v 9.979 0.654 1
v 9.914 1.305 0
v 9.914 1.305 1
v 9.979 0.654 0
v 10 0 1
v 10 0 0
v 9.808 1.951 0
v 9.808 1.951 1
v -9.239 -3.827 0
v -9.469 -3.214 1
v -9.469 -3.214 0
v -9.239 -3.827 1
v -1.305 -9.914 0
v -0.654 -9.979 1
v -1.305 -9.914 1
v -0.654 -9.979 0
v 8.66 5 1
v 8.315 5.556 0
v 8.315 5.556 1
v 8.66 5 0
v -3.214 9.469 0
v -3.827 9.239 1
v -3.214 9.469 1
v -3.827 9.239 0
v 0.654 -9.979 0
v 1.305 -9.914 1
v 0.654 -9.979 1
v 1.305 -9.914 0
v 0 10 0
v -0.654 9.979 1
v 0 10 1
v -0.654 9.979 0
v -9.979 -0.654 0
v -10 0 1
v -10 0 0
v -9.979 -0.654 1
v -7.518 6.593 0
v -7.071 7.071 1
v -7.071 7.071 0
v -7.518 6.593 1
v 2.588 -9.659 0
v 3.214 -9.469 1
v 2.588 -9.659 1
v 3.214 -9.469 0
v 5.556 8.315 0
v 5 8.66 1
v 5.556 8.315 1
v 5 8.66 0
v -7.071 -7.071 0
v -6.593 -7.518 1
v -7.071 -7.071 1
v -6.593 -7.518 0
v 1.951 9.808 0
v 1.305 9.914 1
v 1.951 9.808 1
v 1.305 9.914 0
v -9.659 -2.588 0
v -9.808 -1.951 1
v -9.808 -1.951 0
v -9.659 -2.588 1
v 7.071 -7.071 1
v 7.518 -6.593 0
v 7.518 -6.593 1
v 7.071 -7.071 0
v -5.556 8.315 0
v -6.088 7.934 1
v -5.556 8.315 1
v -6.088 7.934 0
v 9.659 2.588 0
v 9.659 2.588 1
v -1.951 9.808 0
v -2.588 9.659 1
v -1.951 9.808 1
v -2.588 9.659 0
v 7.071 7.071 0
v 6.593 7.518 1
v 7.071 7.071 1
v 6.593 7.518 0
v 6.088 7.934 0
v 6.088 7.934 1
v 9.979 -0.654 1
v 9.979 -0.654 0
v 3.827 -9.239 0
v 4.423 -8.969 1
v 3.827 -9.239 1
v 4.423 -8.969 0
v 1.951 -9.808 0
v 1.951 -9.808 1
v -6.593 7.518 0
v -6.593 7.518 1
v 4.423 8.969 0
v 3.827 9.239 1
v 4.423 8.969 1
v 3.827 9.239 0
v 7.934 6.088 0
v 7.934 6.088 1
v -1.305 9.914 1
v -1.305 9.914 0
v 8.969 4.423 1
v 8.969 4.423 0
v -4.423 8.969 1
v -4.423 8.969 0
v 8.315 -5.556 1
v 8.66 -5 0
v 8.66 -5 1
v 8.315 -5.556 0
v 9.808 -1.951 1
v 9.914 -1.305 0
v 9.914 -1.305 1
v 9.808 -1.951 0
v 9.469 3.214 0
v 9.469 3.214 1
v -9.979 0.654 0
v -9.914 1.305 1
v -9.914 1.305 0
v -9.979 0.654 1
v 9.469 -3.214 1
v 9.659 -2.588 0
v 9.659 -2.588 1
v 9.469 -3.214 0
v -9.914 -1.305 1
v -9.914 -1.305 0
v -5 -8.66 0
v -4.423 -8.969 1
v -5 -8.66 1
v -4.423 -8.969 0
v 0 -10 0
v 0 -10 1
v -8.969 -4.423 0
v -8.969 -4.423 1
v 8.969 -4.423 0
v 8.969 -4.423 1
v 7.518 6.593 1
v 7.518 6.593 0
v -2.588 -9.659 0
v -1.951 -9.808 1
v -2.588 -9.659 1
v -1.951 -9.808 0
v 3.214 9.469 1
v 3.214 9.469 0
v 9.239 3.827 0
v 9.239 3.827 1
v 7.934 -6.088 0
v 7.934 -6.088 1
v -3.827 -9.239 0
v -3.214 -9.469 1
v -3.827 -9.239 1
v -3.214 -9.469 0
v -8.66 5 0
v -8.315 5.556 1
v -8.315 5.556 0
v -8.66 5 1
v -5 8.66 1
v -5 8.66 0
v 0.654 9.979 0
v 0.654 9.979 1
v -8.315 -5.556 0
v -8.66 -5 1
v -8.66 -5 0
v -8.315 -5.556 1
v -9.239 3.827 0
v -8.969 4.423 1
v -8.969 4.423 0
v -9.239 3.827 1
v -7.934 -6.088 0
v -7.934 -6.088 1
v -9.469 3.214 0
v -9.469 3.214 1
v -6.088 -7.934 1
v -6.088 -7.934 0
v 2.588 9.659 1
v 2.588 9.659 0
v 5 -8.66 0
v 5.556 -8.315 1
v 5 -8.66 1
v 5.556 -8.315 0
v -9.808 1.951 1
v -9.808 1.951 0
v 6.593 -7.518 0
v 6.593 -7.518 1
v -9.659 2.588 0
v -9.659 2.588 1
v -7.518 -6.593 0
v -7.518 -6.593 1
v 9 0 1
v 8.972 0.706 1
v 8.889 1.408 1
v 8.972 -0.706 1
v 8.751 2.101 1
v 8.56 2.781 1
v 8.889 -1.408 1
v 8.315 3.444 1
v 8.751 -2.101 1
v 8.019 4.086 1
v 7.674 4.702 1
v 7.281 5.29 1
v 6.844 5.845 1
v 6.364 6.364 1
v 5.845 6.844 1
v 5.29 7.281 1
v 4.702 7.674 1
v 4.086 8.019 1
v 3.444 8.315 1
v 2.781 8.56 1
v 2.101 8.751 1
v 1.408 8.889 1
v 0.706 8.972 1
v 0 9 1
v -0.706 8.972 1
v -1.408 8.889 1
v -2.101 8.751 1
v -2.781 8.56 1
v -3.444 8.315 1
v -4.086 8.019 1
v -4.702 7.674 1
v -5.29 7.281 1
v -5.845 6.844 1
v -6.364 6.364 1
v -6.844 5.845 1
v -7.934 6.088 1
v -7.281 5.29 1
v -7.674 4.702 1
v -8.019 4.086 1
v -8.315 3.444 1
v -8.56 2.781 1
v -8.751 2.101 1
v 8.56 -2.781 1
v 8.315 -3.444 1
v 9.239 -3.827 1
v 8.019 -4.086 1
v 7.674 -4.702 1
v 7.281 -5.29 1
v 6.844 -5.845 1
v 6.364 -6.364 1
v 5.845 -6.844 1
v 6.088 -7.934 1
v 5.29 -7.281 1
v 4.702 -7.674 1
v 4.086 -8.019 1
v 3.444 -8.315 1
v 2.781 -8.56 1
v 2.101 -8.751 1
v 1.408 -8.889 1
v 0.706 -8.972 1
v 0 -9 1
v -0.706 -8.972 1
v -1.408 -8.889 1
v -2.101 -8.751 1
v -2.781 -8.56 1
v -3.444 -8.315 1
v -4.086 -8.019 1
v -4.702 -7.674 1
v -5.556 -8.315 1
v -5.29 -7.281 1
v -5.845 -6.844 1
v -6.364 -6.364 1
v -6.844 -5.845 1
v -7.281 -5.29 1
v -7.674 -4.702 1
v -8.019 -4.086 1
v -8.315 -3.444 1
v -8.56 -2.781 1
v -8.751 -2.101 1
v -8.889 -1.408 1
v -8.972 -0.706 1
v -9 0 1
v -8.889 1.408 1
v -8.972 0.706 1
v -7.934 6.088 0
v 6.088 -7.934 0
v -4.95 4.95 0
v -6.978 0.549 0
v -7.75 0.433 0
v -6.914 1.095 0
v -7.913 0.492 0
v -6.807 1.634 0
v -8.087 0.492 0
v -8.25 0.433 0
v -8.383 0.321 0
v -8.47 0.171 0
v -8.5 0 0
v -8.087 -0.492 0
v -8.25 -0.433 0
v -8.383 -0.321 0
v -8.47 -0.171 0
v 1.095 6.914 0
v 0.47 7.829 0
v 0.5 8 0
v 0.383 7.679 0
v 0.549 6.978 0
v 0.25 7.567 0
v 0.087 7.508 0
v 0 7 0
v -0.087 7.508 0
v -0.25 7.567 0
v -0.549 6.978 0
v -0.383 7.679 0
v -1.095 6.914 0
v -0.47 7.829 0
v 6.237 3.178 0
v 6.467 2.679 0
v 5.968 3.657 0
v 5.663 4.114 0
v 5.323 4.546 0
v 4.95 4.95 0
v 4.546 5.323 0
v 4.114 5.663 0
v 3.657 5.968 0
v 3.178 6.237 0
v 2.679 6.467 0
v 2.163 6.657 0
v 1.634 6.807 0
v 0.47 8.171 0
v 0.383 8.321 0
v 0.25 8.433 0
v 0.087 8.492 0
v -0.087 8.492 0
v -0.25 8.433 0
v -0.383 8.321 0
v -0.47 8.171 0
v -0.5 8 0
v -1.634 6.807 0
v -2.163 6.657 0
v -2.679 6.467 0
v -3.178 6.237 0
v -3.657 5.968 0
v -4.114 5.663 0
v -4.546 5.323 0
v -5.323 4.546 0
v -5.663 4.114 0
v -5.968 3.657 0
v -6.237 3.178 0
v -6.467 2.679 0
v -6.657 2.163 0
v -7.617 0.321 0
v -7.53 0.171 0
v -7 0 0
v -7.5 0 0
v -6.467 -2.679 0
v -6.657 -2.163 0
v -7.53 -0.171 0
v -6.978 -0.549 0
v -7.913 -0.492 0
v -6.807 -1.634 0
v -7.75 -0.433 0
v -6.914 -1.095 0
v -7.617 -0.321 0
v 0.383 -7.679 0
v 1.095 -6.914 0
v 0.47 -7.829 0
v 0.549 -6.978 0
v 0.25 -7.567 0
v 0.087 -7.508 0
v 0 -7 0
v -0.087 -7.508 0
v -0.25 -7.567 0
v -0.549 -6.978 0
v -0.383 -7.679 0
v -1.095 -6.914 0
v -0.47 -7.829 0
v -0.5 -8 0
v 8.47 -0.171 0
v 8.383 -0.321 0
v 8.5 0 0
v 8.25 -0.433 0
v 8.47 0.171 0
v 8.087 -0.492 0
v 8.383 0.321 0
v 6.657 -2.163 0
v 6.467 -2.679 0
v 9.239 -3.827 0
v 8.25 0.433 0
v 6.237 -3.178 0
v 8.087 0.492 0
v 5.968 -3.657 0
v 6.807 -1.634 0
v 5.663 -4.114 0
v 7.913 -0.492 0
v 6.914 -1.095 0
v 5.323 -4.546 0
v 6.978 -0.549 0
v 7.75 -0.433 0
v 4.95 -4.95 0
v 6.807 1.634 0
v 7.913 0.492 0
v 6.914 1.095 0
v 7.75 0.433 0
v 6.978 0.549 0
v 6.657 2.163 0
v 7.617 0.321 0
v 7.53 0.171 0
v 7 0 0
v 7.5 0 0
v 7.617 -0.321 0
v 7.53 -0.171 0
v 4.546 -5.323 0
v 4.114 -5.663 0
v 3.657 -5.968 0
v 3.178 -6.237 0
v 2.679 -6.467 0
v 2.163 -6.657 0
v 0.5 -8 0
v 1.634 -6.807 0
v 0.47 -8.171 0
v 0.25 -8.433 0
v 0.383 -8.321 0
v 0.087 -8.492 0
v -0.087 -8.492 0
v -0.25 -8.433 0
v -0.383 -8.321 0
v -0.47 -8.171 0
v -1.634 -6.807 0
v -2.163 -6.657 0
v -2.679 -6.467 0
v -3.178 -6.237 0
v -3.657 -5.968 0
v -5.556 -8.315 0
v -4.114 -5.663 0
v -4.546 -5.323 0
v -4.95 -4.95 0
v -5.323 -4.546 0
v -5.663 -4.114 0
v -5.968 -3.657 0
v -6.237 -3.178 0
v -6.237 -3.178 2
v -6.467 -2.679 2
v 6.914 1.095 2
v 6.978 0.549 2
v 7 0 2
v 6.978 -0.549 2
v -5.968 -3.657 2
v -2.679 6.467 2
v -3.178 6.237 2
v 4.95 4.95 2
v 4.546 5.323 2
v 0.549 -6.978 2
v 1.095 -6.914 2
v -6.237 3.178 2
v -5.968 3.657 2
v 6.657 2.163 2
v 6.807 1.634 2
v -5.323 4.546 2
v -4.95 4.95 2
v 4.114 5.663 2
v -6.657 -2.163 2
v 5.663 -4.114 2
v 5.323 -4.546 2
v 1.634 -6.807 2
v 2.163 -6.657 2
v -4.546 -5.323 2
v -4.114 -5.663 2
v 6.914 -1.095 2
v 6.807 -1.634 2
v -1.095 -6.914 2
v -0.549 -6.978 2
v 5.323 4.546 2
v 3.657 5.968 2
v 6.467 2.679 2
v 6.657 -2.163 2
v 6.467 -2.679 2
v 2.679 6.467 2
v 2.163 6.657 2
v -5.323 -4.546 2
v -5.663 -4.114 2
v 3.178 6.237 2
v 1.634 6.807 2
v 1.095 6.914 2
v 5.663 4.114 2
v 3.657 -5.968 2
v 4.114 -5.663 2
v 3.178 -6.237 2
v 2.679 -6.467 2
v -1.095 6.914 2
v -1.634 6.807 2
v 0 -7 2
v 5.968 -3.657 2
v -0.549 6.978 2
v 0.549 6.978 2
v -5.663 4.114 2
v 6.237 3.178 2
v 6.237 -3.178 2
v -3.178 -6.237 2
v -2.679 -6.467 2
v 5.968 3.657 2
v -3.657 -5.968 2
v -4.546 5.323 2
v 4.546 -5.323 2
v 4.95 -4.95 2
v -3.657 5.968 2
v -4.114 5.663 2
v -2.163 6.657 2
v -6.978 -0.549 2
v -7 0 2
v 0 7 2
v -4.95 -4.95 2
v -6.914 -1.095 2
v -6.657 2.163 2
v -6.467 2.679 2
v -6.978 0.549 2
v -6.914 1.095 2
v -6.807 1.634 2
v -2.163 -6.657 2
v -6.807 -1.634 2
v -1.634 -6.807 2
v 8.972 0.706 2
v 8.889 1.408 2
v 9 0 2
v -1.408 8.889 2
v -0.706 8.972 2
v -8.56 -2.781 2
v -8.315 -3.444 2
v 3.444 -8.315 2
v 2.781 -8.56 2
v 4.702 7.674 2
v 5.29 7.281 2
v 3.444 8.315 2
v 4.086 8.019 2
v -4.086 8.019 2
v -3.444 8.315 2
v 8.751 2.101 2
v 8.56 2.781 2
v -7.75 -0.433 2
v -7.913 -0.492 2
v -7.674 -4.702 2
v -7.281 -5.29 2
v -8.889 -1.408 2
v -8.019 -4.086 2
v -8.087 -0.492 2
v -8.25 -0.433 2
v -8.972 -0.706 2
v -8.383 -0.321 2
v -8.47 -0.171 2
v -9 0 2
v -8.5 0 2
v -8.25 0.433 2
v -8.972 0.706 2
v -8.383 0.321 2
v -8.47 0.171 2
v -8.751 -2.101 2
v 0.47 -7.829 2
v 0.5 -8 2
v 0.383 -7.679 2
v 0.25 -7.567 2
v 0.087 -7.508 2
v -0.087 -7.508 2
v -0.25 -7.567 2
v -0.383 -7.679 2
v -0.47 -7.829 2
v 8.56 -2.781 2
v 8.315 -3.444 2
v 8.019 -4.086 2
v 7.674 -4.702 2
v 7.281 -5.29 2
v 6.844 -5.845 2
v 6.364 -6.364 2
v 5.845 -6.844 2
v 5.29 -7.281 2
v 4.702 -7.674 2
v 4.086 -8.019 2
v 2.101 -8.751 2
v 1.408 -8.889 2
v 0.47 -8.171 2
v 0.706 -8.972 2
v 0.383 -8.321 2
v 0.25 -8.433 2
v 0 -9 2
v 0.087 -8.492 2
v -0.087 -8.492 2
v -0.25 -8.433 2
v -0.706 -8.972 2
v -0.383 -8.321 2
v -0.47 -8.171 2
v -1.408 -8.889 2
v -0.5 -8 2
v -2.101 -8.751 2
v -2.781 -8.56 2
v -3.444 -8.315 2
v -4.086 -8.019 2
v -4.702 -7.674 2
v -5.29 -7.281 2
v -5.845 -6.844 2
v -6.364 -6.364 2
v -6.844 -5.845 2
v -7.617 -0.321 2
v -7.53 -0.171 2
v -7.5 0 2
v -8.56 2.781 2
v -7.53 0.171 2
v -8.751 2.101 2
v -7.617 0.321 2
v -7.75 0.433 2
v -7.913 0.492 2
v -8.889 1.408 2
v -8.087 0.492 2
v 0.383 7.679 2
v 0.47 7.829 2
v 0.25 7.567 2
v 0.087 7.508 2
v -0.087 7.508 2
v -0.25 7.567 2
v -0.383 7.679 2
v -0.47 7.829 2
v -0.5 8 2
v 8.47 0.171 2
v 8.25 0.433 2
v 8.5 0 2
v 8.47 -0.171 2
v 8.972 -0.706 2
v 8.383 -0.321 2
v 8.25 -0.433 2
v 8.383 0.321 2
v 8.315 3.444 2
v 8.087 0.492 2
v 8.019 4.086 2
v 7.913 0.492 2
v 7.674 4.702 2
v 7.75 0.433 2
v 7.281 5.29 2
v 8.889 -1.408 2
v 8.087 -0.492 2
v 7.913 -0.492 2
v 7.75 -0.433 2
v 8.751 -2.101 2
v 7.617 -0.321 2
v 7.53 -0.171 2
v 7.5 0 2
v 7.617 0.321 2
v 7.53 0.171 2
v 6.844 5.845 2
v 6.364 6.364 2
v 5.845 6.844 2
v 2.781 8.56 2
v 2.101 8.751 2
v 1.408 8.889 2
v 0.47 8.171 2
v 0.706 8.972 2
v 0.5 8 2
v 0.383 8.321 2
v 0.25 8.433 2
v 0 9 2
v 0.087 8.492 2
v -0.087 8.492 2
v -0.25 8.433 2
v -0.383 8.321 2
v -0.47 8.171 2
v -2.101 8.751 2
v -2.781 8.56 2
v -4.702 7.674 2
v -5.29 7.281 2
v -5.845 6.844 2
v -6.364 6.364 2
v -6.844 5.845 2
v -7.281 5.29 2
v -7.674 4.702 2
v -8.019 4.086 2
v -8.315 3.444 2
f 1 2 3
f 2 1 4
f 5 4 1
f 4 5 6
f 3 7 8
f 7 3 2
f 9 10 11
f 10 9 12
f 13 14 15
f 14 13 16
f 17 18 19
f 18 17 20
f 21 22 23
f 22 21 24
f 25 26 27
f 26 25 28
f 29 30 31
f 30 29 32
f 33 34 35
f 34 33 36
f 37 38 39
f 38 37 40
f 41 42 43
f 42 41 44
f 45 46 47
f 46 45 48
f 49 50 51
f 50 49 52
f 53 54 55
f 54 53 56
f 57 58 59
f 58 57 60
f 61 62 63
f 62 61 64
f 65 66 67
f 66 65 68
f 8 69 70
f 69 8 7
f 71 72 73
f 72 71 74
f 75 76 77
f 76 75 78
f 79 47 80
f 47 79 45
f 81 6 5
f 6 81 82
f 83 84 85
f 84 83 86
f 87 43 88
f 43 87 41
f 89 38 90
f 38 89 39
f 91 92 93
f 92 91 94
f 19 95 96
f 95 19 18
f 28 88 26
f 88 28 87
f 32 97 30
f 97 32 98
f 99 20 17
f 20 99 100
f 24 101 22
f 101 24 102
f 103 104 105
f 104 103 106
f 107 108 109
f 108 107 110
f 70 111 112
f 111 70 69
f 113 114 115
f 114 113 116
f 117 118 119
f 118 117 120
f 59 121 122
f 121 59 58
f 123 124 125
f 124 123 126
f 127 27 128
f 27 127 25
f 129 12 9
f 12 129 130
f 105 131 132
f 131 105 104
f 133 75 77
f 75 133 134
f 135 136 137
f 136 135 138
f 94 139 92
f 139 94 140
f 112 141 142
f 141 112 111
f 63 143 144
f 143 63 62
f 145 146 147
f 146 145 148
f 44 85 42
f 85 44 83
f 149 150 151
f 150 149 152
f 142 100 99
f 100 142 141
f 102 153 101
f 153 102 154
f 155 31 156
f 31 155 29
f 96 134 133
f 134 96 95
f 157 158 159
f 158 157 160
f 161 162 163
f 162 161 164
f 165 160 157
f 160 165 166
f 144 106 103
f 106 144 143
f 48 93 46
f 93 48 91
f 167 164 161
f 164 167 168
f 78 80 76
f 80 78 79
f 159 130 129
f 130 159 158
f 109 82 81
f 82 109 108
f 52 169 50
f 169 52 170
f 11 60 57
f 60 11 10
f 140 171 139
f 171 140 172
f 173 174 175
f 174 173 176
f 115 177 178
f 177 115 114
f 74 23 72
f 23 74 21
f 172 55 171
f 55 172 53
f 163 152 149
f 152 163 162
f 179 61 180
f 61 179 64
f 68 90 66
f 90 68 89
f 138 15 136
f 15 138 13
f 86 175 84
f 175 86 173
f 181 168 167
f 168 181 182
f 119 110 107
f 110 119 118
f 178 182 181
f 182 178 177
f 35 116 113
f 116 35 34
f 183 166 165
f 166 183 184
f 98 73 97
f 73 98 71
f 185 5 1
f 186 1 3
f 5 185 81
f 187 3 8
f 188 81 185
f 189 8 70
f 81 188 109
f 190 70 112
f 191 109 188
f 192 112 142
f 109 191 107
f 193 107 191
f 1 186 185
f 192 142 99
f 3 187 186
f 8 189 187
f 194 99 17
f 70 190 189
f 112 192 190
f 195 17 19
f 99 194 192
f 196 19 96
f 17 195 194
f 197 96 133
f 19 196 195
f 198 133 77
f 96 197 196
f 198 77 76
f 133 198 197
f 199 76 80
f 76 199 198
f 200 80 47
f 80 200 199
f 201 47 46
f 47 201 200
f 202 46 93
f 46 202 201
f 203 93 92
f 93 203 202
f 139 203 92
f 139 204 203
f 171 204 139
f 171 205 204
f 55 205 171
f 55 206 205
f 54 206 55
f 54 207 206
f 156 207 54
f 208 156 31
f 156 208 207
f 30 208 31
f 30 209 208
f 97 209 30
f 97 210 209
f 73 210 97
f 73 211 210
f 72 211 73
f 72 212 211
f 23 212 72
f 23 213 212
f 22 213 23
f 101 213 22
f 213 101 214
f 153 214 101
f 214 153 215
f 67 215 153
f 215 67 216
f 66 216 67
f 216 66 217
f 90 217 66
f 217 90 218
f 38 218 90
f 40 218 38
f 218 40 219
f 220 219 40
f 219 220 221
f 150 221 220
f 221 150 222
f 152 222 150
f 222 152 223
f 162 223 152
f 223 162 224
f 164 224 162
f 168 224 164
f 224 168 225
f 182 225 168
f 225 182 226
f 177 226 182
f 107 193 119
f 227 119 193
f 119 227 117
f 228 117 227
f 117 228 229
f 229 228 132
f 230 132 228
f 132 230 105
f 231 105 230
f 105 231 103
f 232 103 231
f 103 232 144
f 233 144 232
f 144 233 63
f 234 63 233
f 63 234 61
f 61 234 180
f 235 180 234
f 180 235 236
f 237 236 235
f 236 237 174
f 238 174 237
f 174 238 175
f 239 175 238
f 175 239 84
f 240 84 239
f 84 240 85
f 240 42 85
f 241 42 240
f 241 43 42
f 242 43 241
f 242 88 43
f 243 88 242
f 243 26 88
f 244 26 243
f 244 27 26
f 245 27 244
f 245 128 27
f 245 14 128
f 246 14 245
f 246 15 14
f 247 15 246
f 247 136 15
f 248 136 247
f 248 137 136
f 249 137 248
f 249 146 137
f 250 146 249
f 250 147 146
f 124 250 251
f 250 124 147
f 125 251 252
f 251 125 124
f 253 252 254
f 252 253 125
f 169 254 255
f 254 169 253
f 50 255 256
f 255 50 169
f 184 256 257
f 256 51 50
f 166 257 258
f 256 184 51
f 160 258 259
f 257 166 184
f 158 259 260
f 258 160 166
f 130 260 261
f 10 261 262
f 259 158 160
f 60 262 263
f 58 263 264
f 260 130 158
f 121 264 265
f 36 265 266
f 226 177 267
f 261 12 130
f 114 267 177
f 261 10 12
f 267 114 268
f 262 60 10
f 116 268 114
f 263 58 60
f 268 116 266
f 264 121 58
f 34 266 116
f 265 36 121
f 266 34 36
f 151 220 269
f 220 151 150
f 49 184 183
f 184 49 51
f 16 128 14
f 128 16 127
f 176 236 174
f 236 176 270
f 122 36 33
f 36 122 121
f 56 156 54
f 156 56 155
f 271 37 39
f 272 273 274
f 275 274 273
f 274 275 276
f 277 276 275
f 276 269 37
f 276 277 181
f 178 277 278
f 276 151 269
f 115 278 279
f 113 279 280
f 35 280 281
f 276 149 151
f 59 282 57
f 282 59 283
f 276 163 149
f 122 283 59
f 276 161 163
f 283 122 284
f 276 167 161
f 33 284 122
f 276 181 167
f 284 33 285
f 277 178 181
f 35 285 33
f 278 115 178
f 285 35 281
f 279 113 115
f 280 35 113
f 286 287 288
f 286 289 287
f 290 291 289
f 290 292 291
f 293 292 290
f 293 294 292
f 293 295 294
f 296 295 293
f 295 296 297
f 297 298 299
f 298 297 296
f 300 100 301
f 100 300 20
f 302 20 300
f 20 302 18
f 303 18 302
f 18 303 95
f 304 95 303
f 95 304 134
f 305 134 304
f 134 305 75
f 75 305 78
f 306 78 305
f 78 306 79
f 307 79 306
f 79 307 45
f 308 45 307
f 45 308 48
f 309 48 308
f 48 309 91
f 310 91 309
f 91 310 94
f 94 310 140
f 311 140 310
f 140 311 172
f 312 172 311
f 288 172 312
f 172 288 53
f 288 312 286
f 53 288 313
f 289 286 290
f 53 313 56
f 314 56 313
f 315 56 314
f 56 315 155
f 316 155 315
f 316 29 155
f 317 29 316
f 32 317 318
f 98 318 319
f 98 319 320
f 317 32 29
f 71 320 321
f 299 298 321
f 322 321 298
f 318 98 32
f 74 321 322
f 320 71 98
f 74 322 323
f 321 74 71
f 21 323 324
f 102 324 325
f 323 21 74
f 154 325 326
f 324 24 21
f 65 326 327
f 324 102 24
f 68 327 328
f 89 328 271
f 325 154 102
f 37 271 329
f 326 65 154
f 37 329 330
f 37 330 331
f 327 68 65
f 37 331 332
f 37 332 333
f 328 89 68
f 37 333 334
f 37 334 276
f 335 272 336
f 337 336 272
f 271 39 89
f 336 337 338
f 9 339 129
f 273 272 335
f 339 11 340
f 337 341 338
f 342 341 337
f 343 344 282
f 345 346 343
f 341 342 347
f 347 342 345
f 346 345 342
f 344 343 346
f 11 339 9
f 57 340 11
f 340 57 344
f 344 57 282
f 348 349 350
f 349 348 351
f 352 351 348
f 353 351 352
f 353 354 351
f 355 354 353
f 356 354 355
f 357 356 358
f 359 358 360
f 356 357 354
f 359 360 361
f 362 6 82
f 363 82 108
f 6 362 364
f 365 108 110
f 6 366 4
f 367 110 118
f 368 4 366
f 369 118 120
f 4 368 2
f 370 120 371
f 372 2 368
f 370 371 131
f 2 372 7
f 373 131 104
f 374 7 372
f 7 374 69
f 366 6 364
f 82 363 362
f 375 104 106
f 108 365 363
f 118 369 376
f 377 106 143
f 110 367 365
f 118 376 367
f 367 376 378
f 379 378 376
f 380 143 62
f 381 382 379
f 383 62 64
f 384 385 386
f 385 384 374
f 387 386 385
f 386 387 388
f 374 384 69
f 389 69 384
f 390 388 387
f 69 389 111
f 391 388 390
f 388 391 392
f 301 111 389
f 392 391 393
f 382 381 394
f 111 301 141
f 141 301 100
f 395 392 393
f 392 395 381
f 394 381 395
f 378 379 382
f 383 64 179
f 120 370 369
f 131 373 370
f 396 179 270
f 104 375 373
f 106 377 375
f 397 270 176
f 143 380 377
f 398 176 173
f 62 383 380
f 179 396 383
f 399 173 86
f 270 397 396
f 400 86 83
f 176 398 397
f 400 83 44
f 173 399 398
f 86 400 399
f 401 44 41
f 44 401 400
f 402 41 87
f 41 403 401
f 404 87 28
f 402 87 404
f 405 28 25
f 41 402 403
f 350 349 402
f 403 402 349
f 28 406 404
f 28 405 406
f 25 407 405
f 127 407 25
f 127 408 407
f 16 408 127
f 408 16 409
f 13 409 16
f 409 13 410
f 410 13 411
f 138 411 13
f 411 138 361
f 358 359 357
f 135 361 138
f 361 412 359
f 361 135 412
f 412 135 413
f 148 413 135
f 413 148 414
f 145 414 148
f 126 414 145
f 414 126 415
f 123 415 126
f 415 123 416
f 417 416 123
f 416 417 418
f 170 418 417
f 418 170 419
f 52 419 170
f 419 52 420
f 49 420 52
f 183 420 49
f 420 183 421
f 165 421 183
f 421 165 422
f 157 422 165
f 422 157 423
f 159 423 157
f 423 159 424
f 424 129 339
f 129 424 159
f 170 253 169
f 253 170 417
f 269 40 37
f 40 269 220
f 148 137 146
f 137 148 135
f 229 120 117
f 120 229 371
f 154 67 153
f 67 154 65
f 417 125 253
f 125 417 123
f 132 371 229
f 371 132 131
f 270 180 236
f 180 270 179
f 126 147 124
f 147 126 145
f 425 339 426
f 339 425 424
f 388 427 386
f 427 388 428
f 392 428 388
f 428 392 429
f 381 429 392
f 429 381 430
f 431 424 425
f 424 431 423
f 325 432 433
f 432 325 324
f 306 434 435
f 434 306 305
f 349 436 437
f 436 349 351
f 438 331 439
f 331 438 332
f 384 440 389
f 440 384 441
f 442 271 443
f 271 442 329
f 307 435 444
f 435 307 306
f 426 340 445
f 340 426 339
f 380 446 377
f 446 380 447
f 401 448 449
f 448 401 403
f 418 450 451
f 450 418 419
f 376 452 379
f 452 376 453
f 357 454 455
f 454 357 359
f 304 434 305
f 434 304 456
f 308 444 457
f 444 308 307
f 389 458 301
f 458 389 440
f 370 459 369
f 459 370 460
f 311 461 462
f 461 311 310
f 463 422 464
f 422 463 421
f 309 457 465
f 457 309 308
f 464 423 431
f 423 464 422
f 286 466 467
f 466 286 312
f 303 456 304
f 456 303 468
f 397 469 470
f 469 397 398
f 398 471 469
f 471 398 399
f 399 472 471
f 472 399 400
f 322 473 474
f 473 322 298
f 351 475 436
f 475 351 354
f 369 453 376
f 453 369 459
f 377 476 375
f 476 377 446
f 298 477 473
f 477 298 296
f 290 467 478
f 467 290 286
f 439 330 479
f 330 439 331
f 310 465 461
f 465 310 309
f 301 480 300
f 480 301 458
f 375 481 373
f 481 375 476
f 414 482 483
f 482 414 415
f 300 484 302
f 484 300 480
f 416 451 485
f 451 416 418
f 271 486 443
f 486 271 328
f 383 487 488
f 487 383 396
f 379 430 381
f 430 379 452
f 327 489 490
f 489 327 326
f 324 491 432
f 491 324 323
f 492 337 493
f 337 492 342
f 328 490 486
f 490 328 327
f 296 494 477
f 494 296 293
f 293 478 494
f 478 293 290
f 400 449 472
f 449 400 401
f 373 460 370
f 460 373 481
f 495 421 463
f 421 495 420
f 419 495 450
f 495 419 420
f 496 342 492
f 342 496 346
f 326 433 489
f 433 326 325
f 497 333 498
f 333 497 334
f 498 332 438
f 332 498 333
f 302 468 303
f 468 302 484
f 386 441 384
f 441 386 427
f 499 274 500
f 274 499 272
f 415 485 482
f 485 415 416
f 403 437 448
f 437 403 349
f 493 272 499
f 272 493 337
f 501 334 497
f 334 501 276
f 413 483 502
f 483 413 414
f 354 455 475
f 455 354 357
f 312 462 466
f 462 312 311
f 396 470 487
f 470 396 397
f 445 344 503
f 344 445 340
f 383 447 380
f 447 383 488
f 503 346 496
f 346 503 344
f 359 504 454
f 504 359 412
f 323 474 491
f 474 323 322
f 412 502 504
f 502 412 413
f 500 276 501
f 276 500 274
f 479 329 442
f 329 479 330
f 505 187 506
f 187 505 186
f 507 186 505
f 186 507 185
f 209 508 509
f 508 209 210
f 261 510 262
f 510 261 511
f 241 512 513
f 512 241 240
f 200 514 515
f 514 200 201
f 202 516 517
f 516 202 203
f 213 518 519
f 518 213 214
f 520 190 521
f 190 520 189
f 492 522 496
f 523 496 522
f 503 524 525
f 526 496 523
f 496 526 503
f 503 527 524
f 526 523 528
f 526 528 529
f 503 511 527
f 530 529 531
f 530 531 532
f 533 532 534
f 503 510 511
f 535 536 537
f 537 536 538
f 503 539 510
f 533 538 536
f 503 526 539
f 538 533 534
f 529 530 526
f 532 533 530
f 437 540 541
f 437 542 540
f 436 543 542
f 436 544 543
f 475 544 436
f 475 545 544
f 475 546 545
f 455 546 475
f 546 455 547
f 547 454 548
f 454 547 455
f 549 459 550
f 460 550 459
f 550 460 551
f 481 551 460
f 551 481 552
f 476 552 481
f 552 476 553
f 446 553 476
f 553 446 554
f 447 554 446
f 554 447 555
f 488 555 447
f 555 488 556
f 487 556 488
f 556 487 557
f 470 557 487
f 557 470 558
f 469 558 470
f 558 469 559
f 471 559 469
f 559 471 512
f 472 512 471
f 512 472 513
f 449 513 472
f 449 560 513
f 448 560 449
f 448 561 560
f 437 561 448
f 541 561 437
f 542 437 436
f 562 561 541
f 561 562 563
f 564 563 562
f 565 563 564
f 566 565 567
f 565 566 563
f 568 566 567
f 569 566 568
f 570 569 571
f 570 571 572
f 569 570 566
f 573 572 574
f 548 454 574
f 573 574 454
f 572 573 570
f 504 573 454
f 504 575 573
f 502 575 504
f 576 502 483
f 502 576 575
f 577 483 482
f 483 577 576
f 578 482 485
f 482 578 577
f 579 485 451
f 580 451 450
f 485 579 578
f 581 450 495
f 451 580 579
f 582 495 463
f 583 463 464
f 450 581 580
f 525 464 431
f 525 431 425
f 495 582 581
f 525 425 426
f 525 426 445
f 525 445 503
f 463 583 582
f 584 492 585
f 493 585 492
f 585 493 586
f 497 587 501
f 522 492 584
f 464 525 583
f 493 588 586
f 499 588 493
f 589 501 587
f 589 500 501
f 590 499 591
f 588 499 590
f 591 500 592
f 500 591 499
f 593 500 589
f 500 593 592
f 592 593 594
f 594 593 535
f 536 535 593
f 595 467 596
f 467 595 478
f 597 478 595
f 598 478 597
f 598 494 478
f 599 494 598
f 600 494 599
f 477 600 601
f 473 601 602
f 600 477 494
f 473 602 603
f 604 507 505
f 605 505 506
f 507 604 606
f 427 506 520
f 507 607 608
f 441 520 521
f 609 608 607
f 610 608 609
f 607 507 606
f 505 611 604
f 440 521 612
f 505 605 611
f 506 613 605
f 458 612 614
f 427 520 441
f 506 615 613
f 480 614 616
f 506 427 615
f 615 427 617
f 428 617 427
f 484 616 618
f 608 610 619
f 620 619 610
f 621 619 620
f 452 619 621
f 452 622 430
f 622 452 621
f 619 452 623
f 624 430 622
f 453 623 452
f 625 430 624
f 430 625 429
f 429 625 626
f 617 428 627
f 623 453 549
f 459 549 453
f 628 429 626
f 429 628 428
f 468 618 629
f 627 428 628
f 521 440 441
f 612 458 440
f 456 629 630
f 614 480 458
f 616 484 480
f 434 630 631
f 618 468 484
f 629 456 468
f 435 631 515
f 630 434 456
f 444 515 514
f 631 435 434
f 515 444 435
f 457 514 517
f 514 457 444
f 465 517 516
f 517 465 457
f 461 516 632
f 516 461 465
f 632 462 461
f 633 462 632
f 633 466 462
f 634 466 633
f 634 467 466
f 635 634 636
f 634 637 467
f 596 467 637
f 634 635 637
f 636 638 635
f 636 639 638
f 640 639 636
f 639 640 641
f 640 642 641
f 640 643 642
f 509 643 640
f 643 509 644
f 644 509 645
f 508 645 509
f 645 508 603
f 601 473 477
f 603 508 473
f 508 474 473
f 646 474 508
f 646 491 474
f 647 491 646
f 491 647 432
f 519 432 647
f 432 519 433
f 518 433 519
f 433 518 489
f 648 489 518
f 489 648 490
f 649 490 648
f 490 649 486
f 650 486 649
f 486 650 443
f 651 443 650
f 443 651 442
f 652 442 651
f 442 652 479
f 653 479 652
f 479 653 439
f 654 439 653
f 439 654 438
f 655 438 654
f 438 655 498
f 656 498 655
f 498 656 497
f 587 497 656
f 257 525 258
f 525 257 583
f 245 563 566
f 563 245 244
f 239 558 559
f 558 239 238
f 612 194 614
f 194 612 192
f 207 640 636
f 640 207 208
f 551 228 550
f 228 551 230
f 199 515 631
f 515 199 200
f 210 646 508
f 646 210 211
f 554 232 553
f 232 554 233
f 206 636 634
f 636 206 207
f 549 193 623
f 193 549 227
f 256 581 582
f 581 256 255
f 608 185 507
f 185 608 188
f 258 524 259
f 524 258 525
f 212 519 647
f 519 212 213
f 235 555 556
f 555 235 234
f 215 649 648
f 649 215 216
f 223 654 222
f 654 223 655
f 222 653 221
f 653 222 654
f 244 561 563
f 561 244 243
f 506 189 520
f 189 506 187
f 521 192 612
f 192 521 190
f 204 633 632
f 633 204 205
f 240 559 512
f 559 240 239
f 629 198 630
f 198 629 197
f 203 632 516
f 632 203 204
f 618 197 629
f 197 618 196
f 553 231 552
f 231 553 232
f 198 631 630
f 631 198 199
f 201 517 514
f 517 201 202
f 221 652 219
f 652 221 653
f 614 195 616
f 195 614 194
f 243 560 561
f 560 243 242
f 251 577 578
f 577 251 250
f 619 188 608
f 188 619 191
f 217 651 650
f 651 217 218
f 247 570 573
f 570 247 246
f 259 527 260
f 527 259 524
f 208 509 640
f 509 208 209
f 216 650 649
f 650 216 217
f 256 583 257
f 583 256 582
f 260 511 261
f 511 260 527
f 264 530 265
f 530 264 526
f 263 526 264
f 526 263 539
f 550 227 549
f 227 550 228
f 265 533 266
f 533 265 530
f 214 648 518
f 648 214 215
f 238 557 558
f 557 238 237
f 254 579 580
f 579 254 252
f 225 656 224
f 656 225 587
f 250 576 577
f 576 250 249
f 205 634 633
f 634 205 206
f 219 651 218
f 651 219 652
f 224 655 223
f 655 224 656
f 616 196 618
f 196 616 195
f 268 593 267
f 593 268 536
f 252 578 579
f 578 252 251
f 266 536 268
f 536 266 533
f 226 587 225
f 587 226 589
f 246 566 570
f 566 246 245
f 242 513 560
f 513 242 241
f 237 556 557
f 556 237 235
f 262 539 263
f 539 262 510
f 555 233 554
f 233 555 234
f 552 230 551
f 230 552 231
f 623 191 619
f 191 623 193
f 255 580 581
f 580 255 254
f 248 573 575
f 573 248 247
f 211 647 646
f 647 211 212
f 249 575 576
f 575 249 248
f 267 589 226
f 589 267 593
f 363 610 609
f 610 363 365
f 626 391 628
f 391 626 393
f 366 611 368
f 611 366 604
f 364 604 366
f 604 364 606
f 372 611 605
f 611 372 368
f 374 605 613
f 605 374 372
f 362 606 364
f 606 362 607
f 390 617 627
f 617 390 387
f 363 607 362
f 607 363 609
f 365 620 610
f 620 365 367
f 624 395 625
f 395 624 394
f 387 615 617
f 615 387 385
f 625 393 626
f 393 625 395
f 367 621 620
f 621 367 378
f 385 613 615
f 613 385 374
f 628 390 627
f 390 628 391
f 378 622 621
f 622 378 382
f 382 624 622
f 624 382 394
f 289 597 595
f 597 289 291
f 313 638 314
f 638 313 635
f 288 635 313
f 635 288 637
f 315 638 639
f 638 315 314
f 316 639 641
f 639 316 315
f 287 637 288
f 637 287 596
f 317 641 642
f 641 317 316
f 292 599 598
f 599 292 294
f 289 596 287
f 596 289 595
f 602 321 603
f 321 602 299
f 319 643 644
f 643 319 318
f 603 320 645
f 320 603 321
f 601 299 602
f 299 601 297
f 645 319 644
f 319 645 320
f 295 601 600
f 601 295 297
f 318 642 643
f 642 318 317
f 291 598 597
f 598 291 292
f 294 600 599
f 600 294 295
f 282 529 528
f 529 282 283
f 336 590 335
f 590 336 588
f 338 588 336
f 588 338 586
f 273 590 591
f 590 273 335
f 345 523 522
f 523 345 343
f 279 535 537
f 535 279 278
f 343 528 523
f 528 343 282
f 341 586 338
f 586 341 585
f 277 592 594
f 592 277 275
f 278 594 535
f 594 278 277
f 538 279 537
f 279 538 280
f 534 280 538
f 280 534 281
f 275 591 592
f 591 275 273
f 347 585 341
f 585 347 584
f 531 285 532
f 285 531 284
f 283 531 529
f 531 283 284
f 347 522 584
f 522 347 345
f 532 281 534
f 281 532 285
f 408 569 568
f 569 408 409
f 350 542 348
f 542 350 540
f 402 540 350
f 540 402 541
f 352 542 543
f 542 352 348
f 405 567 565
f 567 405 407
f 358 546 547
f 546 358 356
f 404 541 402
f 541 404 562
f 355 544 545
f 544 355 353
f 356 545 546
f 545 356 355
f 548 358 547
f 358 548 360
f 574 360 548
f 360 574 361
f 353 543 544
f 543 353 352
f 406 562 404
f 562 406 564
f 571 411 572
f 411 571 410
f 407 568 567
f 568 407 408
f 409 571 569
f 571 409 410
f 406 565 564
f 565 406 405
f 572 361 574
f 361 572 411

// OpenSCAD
// part_id: mar18
// name: Mars pointer ring inner
// source_drawing_ids: DRW-013
// units: mm
// revision: 0.1
// SPDX-License-Identifier: MIT

module part_mar18(
    outer_d = 20.0,
    mid_d = 18.0,
    inner_d = 14.0,
    base_h = 1.0,
    mid_h = 1.0,
    rivet_d = 1.0,
    rivet_pcd = 16.0,
    rivet_count = 4
) {
    difference() {
        union() {
            difference() {
                cylinder(d = outer_d, h = base_h, $fn = 96);
                translate([0, 0, -0.05]) cylinder(d = inner_d, h = base_h + 0.1, $fn = 80);
            }
            translate([0, 0, base_h])
                difference() {
                    cylinder(d = mid_d, h = mid_h, $fn = 80);
                    translate([0, 0, -0.05]) cylinder(d = inner_d, h = mid_h + 0.1, $fn = 80);
                }
        }
        for (i = [0 : rivet_count - 1]) {
            a = i * 360 / rivet_count;
            translate([(rivet_pcd / 2) * cos(a), (rivet_pcd / 2) * sin(a), -0.1])
                cylinder(d = rivet_d, h = base_h + mid_h + 0.2, $fn = 18);
        }
    }
}

// ---- "main guard" ----
if (is_undef(__LIB_MODE__)) {
    part_mar18();
}
